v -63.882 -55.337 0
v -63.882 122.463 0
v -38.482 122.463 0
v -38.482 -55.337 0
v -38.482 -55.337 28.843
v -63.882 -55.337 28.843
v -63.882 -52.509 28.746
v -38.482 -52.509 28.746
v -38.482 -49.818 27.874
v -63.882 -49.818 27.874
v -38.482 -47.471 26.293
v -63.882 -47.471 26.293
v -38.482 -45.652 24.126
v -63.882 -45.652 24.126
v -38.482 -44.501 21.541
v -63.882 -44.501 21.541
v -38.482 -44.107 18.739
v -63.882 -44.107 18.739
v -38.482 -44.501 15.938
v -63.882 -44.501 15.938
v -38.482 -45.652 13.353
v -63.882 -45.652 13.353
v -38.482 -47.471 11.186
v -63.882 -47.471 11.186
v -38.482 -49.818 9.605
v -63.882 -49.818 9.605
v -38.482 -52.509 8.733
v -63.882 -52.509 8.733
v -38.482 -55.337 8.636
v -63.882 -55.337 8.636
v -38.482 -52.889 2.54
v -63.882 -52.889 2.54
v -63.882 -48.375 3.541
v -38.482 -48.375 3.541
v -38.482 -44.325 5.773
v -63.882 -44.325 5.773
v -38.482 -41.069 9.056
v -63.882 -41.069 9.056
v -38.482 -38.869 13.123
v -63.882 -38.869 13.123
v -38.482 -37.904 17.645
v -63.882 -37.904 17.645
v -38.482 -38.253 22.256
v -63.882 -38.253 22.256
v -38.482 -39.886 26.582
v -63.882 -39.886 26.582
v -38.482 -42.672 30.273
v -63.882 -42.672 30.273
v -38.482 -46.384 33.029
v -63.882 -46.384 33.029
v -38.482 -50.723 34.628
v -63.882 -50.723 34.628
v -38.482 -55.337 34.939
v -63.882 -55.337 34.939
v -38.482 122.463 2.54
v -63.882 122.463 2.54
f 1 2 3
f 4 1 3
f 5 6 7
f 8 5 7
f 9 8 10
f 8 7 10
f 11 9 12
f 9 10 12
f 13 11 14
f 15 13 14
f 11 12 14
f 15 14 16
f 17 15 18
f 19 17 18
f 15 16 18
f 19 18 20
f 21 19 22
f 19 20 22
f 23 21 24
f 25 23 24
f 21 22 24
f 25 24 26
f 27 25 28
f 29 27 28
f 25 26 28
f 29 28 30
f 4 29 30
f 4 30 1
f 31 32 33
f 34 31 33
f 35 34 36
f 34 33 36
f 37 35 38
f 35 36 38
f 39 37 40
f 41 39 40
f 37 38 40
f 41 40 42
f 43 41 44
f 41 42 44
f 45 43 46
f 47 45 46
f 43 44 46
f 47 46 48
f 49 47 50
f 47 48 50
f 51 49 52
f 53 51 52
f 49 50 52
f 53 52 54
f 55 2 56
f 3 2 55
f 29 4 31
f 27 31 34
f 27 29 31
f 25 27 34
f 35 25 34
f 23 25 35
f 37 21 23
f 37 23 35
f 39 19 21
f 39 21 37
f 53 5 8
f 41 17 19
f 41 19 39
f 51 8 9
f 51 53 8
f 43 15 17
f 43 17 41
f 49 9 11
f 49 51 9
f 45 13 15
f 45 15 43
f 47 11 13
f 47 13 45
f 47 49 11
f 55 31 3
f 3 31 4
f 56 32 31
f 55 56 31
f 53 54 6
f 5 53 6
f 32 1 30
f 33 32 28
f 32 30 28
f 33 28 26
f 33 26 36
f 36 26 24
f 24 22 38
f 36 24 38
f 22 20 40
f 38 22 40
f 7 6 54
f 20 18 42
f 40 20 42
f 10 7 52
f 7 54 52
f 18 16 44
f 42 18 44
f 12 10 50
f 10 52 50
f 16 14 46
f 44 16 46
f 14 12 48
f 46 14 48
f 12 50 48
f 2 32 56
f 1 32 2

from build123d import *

# Parameters (mm, degrees)
F0_W     = 25.4
F0_H     = 177.8
F1_DEPTH = 2.54
F4_DEPTH = 25.4


with BuildPart() as f1:
    # F0 (on Top) → F1 (new body)
    with BuildSketch(Plane.XY):
        with Locations((-51.181969, 33.563137)):
            Rectangle(F0_W, F0_H)
    extrude(amount=F1_DEPTH)

    # F3 (on face) → F4 (join)
    with BuildSketch(Plane.YZ.offset(-63.881969)):
        with BuildLine():
            Line((-55.336863, 8.636), (-55.336863, 2.54))
            ThreePointArc((-55.336863, 2.54), (-37.867352, 18.739499), (-55.336863, 34.938998))
            Line((-55.336863, 34.938998), (-55.336863, 28.842998))
            ThreePointArc((-55.336863, 28.842998), (-44.106861, 18.739499), (-55.336863, 8.636))
        make_face()
    extrude(amount=F4_DEPTH)


solid = f1.part
